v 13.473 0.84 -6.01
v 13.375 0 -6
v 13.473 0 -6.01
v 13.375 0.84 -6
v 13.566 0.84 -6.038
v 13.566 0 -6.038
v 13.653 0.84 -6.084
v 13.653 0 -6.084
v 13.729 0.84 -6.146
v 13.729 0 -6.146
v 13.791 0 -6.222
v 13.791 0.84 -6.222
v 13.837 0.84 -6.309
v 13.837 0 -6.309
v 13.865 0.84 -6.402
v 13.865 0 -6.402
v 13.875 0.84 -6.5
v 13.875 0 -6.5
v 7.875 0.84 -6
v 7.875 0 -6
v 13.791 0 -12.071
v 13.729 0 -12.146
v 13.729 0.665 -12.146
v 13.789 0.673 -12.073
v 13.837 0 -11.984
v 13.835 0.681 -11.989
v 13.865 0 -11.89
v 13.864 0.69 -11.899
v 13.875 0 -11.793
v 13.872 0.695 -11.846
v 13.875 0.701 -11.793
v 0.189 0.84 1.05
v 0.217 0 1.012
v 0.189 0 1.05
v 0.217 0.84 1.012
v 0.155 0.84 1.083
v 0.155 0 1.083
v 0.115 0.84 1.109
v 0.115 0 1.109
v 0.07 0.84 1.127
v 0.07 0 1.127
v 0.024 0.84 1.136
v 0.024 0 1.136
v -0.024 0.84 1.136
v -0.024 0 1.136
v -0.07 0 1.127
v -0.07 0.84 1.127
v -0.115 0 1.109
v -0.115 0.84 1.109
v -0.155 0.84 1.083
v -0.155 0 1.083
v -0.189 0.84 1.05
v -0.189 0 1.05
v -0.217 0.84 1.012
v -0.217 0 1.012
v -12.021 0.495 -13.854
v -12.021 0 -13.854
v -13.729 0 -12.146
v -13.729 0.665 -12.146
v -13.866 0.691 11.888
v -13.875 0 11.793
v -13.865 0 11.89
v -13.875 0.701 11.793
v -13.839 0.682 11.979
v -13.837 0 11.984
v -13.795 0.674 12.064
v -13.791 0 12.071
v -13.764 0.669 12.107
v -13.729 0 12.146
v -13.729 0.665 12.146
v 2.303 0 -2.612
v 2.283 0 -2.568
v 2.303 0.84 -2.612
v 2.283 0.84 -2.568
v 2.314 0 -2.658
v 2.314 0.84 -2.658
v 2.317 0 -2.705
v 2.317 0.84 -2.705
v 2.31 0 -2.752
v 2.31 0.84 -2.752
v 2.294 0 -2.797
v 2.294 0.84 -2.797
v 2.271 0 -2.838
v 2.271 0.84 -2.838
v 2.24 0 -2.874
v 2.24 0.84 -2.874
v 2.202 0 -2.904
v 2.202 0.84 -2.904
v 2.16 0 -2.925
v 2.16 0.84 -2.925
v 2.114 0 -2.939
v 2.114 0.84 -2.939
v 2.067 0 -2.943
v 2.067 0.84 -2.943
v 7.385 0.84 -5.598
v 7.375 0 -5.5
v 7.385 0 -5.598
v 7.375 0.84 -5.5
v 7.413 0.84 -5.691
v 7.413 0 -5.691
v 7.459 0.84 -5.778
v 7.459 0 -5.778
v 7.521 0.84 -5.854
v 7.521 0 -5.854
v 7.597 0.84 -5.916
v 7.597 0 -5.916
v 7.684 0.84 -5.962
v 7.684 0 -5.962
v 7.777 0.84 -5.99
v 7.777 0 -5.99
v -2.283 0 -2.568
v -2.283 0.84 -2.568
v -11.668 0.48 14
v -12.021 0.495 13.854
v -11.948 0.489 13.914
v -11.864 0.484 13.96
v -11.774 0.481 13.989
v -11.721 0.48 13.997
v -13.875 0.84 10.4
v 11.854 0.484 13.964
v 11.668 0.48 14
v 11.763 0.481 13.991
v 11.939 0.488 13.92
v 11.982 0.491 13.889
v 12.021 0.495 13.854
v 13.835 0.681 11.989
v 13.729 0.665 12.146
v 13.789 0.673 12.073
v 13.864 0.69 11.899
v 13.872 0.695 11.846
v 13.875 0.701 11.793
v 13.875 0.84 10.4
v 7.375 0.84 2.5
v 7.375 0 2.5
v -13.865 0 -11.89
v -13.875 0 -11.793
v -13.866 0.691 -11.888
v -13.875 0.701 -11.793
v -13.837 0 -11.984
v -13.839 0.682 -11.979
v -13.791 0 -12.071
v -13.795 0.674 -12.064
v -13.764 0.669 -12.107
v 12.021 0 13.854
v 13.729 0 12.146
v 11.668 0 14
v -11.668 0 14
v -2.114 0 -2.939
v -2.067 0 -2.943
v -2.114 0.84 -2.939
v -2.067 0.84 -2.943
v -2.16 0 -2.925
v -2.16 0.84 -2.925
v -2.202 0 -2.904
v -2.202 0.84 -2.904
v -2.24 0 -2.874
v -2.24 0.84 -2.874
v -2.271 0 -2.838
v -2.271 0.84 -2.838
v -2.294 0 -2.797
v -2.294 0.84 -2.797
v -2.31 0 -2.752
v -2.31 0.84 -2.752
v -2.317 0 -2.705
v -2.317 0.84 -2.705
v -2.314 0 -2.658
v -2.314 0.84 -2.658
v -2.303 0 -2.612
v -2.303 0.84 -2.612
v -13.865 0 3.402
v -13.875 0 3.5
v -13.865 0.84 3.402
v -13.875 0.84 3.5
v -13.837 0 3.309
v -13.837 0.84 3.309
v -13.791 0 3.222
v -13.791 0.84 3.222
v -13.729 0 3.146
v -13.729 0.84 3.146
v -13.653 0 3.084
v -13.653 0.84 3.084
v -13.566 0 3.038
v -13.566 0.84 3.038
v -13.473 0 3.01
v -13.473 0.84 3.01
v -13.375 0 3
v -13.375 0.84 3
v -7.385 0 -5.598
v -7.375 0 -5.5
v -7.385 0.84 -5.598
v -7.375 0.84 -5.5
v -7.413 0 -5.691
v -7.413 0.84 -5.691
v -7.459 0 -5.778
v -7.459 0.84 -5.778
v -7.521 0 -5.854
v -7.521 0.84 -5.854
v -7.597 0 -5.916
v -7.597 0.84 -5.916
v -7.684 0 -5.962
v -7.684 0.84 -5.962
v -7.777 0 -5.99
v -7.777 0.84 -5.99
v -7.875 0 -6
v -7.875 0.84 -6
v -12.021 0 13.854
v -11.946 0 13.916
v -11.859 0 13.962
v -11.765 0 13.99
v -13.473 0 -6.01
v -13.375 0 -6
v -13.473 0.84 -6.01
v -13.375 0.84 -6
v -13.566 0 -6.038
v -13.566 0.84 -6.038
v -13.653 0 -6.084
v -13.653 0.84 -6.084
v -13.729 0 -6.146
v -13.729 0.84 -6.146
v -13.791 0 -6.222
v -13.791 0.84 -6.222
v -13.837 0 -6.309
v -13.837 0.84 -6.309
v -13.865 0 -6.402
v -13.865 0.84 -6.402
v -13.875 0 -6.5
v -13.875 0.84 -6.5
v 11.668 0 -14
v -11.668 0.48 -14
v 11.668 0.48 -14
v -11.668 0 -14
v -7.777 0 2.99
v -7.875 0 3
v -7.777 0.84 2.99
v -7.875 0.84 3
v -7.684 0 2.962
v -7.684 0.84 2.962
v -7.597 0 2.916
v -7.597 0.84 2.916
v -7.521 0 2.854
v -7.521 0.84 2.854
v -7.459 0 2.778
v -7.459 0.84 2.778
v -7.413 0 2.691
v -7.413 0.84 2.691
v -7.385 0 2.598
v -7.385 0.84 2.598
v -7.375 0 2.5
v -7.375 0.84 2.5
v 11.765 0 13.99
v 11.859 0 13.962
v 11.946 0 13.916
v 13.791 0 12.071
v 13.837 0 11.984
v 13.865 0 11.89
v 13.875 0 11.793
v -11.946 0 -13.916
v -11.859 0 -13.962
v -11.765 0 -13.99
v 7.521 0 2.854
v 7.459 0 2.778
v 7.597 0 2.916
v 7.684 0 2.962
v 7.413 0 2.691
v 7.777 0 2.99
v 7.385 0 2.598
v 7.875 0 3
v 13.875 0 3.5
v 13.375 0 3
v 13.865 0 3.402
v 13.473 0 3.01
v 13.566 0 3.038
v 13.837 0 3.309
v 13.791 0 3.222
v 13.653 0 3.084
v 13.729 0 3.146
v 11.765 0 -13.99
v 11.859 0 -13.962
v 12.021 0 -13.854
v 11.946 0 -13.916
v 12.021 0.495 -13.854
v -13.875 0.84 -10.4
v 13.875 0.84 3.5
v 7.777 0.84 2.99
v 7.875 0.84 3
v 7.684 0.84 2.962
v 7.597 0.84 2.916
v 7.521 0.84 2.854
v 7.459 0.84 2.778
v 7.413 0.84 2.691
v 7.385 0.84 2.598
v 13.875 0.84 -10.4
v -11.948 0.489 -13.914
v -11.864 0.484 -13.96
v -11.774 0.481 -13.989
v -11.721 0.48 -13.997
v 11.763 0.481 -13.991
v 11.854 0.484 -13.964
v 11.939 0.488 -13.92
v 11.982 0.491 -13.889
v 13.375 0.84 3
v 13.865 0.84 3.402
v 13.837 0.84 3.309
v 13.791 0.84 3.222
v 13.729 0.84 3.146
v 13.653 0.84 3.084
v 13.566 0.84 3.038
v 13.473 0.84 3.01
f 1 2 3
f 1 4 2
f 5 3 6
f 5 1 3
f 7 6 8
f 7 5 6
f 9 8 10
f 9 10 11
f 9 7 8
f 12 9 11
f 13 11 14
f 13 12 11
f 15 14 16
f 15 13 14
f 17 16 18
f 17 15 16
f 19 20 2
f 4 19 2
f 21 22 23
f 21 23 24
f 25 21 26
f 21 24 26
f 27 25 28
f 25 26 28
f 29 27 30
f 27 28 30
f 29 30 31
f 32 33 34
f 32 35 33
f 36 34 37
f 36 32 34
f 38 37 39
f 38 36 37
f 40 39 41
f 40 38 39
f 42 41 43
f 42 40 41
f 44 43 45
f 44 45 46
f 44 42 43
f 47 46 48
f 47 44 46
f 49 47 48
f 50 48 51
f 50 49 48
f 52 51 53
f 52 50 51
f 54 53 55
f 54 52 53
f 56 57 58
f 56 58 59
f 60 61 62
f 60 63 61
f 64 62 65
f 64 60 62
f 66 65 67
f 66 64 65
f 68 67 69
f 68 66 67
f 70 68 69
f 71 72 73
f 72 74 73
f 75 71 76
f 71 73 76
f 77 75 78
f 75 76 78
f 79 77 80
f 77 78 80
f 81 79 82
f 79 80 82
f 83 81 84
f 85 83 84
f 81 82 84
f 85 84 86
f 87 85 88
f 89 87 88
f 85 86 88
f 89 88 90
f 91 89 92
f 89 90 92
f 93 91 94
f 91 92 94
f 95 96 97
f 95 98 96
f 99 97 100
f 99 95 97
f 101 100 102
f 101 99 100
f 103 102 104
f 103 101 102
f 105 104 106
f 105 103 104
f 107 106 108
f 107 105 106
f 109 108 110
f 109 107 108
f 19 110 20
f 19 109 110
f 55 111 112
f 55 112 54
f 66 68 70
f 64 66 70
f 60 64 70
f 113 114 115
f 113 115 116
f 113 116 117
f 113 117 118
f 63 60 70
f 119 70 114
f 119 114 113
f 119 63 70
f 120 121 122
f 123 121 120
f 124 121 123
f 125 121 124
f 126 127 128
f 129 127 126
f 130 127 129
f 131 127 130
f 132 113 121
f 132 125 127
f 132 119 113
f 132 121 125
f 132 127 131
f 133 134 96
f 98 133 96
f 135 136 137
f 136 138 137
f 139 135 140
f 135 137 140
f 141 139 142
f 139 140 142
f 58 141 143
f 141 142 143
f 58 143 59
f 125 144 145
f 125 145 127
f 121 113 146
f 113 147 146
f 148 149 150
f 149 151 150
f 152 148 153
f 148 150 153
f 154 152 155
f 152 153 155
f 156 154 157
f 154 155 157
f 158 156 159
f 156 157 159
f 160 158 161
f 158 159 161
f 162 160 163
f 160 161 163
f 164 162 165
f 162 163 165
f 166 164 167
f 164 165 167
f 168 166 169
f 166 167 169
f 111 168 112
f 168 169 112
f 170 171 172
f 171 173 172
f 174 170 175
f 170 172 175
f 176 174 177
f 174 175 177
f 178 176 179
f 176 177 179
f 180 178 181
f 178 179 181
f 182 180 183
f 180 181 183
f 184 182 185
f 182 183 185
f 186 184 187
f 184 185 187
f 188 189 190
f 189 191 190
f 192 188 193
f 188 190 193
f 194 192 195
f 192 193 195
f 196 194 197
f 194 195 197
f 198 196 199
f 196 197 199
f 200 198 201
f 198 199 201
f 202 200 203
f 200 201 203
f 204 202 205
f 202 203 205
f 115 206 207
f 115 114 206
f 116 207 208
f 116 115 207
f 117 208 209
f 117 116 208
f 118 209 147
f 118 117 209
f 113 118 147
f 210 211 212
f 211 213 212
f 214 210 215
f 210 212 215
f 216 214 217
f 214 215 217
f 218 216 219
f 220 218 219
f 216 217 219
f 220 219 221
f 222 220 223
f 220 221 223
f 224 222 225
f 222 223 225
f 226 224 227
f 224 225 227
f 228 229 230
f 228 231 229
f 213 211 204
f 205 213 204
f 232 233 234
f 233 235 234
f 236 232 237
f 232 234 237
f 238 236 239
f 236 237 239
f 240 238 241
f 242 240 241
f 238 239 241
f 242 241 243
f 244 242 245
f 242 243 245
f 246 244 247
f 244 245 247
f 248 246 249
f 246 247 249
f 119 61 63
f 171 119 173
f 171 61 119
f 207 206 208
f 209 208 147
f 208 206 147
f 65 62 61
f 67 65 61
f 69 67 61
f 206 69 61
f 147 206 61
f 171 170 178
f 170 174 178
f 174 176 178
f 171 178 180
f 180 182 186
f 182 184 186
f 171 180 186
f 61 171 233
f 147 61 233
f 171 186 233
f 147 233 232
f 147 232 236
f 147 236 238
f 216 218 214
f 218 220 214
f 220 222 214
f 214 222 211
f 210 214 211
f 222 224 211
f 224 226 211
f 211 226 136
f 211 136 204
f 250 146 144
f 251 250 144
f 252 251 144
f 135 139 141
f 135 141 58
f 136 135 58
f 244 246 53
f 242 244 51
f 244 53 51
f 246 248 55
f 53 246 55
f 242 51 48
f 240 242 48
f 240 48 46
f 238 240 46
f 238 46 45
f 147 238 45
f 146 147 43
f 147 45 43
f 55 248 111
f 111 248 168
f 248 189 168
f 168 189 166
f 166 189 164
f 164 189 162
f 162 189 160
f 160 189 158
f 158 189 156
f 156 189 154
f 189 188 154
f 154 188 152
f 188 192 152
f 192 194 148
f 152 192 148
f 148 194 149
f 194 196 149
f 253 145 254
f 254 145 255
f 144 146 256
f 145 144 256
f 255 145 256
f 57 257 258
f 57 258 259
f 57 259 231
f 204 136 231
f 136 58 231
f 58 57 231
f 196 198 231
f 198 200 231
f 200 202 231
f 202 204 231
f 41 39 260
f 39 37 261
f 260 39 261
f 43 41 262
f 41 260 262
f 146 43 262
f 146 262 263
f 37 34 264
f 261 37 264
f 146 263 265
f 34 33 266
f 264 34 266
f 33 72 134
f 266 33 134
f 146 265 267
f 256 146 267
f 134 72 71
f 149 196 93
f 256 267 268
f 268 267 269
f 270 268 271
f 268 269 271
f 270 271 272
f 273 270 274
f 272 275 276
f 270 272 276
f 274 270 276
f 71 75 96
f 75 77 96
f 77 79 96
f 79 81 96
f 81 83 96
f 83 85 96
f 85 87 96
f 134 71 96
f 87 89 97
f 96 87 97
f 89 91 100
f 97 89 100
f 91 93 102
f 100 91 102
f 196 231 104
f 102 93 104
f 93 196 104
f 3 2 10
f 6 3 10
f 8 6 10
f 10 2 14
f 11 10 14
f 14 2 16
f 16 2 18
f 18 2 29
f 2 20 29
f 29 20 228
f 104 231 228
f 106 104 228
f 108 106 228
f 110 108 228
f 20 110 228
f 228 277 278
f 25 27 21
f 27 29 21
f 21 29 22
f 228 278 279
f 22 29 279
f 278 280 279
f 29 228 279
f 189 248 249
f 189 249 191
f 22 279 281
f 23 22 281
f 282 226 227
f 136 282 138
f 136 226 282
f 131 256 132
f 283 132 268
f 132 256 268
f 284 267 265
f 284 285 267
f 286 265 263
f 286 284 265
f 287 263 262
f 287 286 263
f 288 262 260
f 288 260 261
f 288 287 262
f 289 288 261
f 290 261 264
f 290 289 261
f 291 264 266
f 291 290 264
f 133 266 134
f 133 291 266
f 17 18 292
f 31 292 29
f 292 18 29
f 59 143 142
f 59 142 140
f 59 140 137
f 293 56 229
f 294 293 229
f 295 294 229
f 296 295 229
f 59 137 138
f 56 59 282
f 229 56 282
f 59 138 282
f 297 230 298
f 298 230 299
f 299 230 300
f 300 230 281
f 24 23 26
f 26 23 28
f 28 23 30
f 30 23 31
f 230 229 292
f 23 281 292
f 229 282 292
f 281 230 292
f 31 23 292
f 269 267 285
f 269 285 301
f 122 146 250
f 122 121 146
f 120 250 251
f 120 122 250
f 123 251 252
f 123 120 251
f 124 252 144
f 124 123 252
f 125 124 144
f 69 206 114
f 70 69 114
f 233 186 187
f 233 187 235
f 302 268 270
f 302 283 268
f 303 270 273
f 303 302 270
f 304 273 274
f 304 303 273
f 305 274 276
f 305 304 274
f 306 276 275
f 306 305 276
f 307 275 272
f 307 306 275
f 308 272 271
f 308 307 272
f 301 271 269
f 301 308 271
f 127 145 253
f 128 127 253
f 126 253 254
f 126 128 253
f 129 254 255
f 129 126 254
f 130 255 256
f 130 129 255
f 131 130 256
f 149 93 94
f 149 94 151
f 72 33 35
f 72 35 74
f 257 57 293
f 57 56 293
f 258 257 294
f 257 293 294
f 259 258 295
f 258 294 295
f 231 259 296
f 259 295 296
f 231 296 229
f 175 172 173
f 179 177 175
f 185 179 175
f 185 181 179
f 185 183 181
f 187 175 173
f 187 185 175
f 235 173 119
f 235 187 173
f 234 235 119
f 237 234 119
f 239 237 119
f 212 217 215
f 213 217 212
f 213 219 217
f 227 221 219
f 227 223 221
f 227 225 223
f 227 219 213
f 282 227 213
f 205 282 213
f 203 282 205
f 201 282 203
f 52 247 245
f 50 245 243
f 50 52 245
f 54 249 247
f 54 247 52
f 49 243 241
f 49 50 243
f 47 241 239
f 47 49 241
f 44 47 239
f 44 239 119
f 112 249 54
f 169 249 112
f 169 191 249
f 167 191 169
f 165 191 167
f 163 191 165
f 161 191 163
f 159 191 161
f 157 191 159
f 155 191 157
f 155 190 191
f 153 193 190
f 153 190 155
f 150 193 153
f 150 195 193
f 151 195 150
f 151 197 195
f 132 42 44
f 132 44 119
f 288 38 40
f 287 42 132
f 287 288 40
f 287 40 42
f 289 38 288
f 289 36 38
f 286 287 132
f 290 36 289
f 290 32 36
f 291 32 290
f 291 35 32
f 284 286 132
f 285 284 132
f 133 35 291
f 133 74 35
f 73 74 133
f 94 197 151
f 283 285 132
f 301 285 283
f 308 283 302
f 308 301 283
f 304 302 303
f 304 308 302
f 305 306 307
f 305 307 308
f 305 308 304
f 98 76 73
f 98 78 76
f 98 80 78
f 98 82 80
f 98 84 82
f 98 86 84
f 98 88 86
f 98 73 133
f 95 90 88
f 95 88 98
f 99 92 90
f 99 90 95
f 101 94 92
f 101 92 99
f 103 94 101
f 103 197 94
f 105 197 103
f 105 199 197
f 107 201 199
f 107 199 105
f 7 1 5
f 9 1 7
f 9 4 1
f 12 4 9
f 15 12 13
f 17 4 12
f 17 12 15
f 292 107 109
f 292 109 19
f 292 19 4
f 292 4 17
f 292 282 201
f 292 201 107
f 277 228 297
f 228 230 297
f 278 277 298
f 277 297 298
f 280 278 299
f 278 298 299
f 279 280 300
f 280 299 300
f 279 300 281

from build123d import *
from OCP.BRepFilletAPI import BRepFilletAPI_MakeChamfer

# Parameters (mm, degrees)
SKETCH1_W           = 27.75
SKETCH1_H           = 28
BOSS_EXTRUDE1_DEPTH = 0.84
CUT_EXTRUDE1_REACH  = 21.729
SKETCH2_W           = 6.5
SKETCH2_H           = 9
CHAMFER1_SIZE       = 2
CHAMFER2_SIZE       = 0.36
CHAMFER2_SIZE2      = 3.6
FILLET1_R           = 0.5
FILLET2_R           = 0.25


with BuildPart() as part:
    # Sketch1 → Boss-Extrude1 (new body)
    with BuildSketch(Plane(origin=(0, 0, 0), x_dir=(1, 0, 0), z_dir=(0, 1, 0))):
        Rectangle(SKETCH1_W, SKETCH1_H)
    extrude(amount=BOSS_EXTRUDE1_DEPTH)

    # Sketch2 → Cut-Extrude1 (cut, up to next)
    with BuildSketch(Plane(origin=(0, 0, 0), x_dir=(1, 0, 0), z_dir=(0, 1, 0)), mode=Mode.PRIVATE) as cut_extrude1_sk1:
        with Locations((-10.625, 1.5)):
            Rectangle(SKETCH2_W, SKETCH2_H)
    cut_extrude1_tool1 = extrude(cut_extrude1_sk1.sketch, amount=CUT_EXTRUDE1_REACH, mode=Mode.PRIVATE) & part.part
    # Sketch2 → Cut-Extrude1 (cut, up to next)
    with BuildSketch(Plane(origin=(0, 0, 0), x_dir=(1, 0, 0), z_dir=(0, 1, 0)), mode=Mode.PRIVATE) as cut_extrude1_sk2:
        with Locations((10.625, 1.5)):
            Rectangle(SKETCH2_W, SKETCH2_H)
    cut_extrude1_tool2 = extrude(cut_extrude1_sk2.sketch, amount=CUT_EXTRUDE1_REACH, mode=Mode.PRIVATE) & part.part
    # Sketch2 → Cut-Extrude1 (cut, up to next)
    with BuildSketch(Plane(origin=(0, 0, 0), x_dir=(1, 0, 0), z_dir=(0, 1, 0)), mode=Mode.PRIVATE) as cut_extrude1_sk3:
        Polygon((0, -1.386751346), (2.5, 2.943375673), (-2.5, 2.943375673), align=None)
    cut_extrude1_tool3 = extrude(cut_extrude1_sk3.sketch, amount=CUT_EXTRUDE1_REACH, mode=Mode.PRIVATE) & part.part
    add(cut_extrude1_tool1.solids().sort_by_distance((-10.625, 0, -1.5))[0], mode=Mode.SUBTRACT)
    add(cut_extrude1_tool2.solids().sort_by_distance((10.625, 0, -1.5))[0], mode=Mode.SUBTRACT)
    add(cut_extrude1_tool3.solids().sort_by_distance((0, 0, -1.5))[0], mode=Mode.SUBTRACT)

    # Chamfer1
    chamfer1_edges = [part.edges().sort_by_distance(p)[0] for p in [
        (-13.875, 0.42, -14),
        (13.875, 0.42, -14),
        (13.875, 0.42, 14),
        (-13.875, 0.42, 14),
    ]]
    chamfer(chamfer1_edges, length=CHAMFER1_SIZE)

    # Chamfer2: one chamfer whose edges measure the first distance from different faces: ONE call of the kernel's chamfer builder (chamfer() names one face for all edges)
    chamfer2_edges_1 = [part.edges().sort_by_distance(p)[0] for p in [
        (0, 0.84, -14),
    ]]
    chamfer2_side_1 = [part.faces().sort_by_distance(p)[0] for p in [
        (0, 0.42, -14),
    ]]
    chamfer2_edges_2 = [part.edges().sort_by_distance(p)[0] for p in [
        (0, 0.84, 14),
    ]]
    chamfer2_side_2 = [part.faces().sort_by_distance(p)[0] for p in [
        (0, 0.42, 14),
    ]]
    chamfer2 = BRepFilletAPI_MakeChamfer(part.part.solid().wrapped)
    for e in chamfer2_edges_1:
        chamfer2.Add(CHAMFER2_SIZE, CHAMFER2_SIZE2, e.wrapped, chamfer2_side_1[0].wrapped)  # the first distance lies on this face
    for e in chamfer2_edges_2:
        chamfer2.Add(CHAMFER2_SIZE, CHAMFER2_SIZE2, e.wrapped, chamfer2_side_2[0].wrapped)  # the first distance lies on this face
    add(Compound.cast(chamfer2.Shape()), mode=Mode.REPLACE)

    # Fillet1
    fillet1_edges = [part.edges().sort_by_distance(p)[0] for p in [
        (-7.375, 0.42, 3),
        (-7.375, 0.42, -6),
        (-13.875, 0.42, -6),
        (-13.875, 0.42, 3),
        (13.875, 0.42, 3),
        (13.875, 0.42, -6),
        (7.375, 0.42, -6),
        (7.375, 0.42, 3),
        (11.875, 0.24, 14),
        (-13.875, 0.34, 12),
        (-11.875, 0.24, -14),
        (13.875, 0.34, -12),
        (-13.875, 0.34, -12),
        (11.875, 0.24, -14),
        (13.875, 0.34, 12),
        (-11.875, 0.24, 14),
    ]]
    fillet(fillet1_edges, radius=FILLET1_R)

    # Fillet2
    fillet2_edges = [part.edges().sort_by_distance(p)[0] for p in [
        (-2.5, 0.42, -2.943375673),
        (0, 0.42, 1.386751346),
        (2.5, 0.42, -2.943375673),
    ]]
    fillet(fillet2_edges, radius=FILLET2_R)


solid = part.part
